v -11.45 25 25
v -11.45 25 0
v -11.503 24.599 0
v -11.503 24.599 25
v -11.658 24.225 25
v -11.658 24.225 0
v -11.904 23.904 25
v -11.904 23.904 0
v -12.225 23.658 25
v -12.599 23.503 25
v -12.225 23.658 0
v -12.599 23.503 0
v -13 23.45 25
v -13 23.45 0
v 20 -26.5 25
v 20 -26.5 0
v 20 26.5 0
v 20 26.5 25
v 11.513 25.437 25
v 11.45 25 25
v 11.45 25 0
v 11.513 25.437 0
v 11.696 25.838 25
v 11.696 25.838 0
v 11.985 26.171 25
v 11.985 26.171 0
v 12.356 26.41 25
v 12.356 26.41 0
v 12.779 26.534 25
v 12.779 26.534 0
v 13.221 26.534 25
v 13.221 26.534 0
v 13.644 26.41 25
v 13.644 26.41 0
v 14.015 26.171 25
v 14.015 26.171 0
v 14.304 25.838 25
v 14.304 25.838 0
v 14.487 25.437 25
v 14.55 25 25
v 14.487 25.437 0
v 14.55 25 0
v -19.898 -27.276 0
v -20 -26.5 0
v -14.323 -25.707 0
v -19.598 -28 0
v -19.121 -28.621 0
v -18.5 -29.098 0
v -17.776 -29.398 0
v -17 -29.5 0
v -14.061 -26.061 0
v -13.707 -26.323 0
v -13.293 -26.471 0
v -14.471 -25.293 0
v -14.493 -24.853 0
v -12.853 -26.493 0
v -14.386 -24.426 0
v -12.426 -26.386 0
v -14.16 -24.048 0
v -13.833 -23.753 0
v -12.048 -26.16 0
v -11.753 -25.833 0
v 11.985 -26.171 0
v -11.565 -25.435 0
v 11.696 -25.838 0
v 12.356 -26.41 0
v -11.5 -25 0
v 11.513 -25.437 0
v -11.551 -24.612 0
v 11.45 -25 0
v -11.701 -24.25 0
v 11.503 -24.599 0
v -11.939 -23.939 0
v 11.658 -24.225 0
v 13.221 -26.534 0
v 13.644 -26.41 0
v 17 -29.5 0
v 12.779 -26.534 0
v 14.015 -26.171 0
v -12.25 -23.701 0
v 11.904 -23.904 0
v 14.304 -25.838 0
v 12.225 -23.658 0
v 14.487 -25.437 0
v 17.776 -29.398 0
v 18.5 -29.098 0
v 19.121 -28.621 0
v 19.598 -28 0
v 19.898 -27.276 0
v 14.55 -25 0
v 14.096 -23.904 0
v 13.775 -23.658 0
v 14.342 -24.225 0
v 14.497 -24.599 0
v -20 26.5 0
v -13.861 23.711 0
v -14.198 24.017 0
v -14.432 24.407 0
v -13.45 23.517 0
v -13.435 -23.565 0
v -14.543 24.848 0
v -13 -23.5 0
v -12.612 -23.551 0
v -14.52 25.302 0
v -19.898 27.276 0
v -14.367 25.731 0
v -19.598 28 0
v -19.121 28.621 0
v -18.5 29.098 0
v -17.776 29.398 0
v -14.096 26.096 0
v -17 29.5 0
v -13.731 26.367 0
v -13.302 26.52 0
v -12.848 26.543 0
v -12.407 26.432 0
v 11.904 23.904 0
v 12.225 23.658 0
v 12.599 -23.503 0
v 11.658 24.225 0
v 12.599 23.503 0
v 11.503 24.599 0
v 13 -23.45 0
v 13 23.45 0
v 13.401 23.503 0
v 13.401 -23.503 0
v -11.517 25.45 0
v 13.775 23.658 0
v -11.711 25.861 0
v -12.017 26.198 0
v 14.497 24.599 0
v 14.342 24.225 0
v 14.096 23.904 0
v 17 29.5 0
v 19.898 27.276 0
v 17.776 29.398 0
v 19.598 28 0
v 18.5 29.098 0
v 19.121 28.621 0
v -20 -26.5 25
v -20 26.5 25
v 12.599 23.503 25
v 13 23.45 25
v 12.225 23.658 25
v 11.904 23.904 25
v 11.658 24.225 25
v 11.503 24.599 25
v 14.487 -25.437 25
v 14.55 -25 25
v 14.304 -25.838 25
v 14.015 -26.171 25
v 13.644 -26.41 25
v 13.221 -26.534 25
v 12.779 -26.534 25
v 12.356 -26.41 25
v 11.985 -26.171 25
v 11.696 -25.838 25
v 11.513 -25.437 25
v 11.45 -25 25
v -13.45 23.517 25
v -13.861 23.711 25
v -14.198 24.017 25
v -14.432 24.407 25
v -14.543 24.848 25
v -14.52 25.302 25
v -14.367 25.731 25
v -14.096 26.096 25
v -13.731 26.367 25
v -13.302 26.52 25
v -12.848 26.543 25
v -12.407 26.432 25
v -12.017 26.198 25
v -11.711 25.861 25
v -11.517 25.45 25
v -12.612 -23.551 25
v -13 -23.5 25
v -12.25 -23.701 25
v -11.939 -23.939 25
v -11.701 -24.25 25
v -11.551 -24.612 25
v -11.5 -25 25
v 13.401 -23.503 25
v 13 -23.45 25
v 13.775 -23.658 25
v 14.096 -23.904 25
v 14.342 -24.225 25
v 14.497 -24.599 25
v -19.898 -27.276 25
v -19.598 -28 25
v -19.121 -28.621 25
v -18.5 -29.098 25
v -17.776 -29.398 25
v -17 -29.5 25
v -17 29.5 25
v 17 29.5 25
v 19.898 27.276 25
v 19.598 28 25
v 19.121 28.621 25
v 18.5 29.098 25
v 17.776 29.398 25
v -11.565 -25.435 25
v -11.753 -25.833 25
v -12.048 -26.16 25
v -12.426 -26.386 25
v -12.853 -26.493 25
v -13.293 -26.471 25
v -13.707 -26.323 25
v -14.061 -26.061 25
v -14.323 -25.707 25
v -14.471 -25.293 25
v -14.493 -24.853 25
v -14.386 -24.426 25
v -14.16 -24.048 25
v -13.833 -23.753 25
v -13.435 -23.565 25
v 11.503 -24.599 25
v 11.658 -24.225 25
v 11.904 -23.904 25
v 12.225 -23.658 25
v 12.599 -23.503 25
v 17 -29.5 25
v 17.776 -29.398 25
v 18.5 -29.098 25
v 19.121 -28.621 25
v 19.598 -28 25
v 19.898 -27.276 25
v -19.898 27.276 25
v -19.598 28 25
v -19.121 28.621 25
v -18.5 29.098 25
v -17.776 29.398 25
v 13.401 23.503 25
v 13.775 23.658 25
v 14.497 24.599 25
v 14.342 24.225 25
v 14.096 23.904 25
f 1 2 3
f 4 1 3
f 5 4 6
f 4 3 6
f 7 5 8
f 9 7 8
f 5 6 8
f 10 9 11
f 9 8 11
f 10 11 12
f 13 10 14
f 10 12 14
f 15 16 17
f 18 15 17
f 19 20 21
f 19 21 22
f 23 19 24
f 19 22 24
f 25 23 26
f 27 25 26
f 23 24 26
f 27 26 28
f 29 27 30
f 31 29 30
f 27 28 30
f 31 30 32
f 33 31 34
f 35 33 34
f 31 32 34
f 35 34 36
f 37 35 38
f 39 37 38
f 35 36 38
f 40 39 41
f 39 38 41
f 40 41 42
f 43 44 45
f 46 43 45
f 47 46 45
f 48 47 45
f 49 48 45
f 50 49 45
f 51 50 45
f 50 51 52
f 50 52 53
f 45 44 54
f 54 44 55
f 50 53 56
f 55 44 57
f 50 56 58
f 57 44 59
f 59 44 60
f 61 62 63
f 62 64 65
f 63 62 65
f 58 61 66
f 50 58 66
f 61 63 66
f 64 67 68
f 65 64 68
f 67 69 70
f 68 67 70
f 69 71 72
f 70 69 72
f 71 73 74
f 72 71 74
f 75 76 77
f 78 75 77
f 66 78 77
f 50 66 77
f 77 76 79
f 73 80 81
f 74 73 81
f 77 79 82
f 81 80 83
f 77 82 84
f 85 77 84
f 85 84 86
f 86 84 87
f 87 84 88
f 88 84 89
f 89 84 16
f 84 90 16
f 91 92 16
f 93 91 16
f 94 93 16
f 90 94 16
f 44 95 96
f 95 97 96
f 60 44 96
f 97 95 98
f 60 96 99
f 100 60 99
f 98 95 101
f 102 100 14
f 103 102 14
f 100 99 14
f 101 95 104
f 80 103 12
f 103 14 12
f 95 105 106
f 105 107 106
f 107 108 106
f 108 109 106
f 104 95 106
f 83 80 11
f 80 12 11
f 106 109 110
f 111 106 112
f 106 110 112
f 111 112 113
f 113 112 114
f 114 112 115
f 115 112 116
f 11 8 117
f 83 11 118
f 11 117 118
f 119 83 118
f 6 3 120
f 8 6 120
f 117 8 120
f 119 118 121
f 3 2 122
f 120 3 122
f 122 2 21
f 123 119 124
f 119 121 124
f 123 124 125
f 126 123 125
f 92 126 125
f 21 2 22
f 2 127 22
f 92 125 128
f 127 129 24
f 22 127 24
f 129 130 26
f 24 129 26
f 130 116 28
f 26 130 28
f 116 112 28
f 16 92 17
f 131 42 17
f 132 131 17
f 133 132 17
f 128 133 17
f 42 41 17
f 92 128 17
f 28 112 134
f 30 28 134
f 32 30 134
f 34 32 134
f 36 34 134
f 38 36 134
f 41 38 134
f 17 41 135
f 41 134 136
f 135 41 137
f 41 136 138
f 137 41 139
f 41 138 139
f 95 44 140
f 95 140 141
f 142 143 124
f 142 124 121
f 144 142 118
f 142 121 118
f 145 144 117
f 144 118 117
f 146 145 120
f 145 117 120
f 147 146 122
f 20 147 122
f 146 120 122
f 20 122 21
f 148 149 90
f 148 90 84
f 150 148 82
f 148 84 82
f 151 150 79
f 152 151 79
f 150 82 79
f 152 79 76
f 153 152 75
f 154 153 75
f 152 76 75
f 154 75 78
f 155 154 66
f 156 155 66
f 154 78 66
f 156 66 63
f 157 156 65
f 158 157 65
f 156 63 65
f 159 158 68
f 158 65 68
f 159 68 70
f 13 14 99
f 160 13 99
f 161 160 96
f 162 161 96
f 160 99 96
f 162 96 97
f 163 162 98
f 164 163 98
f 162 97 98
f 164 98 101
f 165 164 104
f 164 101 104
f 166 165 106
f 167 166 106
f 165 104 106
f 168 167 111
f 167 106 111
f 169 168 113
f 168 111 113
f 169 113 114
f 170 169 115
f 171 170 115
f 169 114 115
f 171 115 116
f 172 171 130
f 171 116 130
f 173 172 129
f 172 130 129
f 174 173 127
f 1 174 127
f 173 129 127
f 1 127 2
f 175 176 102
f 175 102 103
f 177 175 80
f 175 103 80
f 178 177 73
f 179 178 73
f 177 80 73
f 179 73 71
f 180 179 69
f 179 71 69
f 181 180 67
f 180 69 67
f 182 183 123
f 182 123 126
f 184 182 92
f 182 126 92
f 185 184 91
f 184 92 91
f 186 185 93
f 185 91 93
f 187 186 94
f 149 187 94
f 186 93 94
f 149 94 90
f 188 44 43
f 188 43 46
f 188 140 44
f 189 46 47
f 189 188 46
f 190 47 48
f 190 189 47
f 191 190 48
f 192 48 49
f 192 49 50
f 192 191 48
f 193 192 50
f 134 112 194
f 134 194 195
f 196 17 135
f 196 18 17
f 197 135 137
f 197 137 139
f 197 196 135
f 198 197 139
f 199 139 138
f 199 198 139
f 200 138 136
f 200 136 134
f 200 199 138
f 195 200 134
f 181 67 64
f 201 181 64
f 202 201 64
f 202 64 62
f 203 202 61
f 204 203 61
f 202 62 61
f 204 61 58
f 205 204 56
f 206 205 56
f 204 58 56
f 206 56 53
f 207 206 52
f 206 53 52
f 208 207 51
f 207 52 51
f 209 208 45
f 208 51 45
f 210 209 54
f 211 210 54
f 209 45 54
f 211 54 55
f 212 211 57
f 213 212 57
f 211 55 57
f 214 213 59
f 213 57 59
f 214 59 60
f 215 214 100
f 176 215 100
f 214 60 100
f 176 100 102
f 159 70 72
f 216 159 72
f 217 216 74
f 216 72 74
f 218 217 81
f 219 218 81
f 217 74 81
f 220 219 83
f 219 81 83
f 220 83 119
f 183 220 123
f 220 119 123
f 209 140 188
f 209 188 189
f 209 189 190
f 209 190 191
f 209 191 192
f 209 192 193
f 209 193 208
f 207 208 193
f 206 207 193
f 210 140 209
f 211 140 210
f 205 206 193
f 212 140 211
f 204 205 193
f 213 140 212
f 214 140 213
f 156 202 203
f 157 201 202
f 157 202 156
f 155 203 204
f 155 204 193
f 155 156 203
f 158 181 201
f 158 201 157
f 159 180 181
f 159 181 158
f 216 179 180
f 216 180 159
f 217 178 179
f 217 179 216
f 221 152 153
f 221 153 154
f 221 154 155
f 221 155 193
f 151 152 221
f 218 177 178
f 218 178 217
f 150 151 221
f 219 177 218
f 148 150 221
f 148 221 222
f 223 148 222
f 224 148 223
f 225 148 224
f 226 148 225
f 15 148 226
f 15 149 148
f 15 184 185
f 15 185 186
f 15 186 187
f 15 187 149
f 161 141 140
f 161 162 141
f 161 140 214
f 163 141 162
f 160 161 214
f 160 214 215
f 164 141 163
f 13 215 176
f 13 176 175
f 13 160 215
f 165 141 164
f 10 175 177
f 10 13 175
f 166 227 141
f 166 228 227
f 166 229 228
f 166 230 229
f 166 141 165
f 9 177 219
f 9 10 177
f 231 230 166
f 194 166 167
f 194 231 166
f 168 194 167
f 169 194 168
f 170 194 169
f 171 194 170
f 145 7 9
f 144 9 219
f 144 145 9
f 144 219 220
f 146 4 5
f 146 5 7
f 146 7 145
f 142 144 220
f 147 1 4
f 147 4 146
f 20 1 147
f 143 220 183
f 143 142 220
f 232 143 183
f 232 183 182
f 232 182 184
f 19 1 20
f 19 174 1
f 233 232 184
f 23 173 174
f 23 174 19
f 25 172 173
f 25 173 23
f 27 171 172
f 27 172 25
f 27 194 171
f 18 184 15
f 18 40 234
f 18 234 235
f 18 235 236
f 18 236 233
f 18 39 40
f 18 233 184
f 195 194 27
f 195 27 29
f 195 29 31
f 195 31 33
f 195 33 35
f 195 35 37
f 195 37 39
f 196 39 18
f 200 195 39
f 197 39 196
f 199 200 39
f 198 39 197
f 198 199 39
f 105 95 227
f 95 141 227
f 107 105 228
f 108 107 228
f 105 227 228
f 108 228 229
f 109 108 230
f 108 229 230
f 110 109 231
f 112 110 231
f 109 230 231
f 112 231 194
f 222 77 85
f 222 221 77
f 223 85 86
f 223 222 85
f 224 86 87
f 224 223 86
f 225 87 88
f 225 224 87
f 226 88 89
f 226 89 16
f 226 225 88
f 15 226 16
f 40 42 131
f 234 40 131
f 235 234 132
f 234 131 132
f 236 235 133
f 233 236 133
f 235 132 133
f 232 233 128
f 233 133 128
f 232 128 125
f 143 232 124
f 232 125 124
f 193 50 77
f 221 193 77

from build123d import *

# Parameters (mm, degrees)
F0_W     = 40
F0_H     = 59
F1_DEPTH = 25
F2_R     = 3


with BuildPart() as f1:
    # F0 (on Top) → F1 (new body)
    with BuildSketch(Plane.XY):
        Rectangle(F0_W, F0_H)
        with BuildLine():
            ThreePointArc((-13, 23.45), (-14.0960155108, 26.0960155108), (-11.45, 25))
            Line((-11.45, 25), (11.45, 25))
            ThreePointArc((11.45, 25), (13, 26.55), (14.55, 25))
            ThreePointArc((14.55, 25), (14.0960155108, 23.9039844892), (13, 23.45))
            Line((13, 23.45), (13, -23.45))
            ThreePointArc((13, -23.45), (14.0960155108, -23.9039844892), (14.55, -25))
            ThreePointArc((14.55, -25), (13, -26.55), (11.45, -25))
            Line((11.45, -25), (-11.5, -25))
            ThreePointArc((-11.5, -25), (-14.0606601718, -26.0606601718), (-13, -23.5))
            Line((-13, -23.5), (-13, 23.45))
        make_face(mode=Mode.SUBTRACT)
        with BuildLine():
            Line((11.45, 25), (-11.45, 25))
            ThreePointArc((-11.45, 25), (-11.9039844892, 23.9039844892), (-13, 23.45))
            Line((-13, 23.45), (-13, -23.5))
            ThreePointArc((-13, -23.5), (-11.9393398282, -23.9393398282), (-11.5, -25))
            Line((-11.5, -25), (11.45, -25))
            ThreePointArc((11.45, -25), (11.9039844892, -23.9039844892), (13, -23.45))
            Line((13, -23.45), (13, 23.45))
            ThreePointArc((13, 23.45), (11.9039844892, 23.9039844892), (11.45, 25))
        make_face()
    extrude(amount=F1_DEPTH)

    # F2
    f2_edges = [f1.edges().sort_by_distance(p)[0] for p in [
        (-20, 29.5, 12.5),
        (20, 29.5, 12.5),
        (20, -29.5, 12.5),
        (-20, -29.5, 12.5),
    ]]
    fillet(f2_edges, radius=F2_R)


solid = f1.part
